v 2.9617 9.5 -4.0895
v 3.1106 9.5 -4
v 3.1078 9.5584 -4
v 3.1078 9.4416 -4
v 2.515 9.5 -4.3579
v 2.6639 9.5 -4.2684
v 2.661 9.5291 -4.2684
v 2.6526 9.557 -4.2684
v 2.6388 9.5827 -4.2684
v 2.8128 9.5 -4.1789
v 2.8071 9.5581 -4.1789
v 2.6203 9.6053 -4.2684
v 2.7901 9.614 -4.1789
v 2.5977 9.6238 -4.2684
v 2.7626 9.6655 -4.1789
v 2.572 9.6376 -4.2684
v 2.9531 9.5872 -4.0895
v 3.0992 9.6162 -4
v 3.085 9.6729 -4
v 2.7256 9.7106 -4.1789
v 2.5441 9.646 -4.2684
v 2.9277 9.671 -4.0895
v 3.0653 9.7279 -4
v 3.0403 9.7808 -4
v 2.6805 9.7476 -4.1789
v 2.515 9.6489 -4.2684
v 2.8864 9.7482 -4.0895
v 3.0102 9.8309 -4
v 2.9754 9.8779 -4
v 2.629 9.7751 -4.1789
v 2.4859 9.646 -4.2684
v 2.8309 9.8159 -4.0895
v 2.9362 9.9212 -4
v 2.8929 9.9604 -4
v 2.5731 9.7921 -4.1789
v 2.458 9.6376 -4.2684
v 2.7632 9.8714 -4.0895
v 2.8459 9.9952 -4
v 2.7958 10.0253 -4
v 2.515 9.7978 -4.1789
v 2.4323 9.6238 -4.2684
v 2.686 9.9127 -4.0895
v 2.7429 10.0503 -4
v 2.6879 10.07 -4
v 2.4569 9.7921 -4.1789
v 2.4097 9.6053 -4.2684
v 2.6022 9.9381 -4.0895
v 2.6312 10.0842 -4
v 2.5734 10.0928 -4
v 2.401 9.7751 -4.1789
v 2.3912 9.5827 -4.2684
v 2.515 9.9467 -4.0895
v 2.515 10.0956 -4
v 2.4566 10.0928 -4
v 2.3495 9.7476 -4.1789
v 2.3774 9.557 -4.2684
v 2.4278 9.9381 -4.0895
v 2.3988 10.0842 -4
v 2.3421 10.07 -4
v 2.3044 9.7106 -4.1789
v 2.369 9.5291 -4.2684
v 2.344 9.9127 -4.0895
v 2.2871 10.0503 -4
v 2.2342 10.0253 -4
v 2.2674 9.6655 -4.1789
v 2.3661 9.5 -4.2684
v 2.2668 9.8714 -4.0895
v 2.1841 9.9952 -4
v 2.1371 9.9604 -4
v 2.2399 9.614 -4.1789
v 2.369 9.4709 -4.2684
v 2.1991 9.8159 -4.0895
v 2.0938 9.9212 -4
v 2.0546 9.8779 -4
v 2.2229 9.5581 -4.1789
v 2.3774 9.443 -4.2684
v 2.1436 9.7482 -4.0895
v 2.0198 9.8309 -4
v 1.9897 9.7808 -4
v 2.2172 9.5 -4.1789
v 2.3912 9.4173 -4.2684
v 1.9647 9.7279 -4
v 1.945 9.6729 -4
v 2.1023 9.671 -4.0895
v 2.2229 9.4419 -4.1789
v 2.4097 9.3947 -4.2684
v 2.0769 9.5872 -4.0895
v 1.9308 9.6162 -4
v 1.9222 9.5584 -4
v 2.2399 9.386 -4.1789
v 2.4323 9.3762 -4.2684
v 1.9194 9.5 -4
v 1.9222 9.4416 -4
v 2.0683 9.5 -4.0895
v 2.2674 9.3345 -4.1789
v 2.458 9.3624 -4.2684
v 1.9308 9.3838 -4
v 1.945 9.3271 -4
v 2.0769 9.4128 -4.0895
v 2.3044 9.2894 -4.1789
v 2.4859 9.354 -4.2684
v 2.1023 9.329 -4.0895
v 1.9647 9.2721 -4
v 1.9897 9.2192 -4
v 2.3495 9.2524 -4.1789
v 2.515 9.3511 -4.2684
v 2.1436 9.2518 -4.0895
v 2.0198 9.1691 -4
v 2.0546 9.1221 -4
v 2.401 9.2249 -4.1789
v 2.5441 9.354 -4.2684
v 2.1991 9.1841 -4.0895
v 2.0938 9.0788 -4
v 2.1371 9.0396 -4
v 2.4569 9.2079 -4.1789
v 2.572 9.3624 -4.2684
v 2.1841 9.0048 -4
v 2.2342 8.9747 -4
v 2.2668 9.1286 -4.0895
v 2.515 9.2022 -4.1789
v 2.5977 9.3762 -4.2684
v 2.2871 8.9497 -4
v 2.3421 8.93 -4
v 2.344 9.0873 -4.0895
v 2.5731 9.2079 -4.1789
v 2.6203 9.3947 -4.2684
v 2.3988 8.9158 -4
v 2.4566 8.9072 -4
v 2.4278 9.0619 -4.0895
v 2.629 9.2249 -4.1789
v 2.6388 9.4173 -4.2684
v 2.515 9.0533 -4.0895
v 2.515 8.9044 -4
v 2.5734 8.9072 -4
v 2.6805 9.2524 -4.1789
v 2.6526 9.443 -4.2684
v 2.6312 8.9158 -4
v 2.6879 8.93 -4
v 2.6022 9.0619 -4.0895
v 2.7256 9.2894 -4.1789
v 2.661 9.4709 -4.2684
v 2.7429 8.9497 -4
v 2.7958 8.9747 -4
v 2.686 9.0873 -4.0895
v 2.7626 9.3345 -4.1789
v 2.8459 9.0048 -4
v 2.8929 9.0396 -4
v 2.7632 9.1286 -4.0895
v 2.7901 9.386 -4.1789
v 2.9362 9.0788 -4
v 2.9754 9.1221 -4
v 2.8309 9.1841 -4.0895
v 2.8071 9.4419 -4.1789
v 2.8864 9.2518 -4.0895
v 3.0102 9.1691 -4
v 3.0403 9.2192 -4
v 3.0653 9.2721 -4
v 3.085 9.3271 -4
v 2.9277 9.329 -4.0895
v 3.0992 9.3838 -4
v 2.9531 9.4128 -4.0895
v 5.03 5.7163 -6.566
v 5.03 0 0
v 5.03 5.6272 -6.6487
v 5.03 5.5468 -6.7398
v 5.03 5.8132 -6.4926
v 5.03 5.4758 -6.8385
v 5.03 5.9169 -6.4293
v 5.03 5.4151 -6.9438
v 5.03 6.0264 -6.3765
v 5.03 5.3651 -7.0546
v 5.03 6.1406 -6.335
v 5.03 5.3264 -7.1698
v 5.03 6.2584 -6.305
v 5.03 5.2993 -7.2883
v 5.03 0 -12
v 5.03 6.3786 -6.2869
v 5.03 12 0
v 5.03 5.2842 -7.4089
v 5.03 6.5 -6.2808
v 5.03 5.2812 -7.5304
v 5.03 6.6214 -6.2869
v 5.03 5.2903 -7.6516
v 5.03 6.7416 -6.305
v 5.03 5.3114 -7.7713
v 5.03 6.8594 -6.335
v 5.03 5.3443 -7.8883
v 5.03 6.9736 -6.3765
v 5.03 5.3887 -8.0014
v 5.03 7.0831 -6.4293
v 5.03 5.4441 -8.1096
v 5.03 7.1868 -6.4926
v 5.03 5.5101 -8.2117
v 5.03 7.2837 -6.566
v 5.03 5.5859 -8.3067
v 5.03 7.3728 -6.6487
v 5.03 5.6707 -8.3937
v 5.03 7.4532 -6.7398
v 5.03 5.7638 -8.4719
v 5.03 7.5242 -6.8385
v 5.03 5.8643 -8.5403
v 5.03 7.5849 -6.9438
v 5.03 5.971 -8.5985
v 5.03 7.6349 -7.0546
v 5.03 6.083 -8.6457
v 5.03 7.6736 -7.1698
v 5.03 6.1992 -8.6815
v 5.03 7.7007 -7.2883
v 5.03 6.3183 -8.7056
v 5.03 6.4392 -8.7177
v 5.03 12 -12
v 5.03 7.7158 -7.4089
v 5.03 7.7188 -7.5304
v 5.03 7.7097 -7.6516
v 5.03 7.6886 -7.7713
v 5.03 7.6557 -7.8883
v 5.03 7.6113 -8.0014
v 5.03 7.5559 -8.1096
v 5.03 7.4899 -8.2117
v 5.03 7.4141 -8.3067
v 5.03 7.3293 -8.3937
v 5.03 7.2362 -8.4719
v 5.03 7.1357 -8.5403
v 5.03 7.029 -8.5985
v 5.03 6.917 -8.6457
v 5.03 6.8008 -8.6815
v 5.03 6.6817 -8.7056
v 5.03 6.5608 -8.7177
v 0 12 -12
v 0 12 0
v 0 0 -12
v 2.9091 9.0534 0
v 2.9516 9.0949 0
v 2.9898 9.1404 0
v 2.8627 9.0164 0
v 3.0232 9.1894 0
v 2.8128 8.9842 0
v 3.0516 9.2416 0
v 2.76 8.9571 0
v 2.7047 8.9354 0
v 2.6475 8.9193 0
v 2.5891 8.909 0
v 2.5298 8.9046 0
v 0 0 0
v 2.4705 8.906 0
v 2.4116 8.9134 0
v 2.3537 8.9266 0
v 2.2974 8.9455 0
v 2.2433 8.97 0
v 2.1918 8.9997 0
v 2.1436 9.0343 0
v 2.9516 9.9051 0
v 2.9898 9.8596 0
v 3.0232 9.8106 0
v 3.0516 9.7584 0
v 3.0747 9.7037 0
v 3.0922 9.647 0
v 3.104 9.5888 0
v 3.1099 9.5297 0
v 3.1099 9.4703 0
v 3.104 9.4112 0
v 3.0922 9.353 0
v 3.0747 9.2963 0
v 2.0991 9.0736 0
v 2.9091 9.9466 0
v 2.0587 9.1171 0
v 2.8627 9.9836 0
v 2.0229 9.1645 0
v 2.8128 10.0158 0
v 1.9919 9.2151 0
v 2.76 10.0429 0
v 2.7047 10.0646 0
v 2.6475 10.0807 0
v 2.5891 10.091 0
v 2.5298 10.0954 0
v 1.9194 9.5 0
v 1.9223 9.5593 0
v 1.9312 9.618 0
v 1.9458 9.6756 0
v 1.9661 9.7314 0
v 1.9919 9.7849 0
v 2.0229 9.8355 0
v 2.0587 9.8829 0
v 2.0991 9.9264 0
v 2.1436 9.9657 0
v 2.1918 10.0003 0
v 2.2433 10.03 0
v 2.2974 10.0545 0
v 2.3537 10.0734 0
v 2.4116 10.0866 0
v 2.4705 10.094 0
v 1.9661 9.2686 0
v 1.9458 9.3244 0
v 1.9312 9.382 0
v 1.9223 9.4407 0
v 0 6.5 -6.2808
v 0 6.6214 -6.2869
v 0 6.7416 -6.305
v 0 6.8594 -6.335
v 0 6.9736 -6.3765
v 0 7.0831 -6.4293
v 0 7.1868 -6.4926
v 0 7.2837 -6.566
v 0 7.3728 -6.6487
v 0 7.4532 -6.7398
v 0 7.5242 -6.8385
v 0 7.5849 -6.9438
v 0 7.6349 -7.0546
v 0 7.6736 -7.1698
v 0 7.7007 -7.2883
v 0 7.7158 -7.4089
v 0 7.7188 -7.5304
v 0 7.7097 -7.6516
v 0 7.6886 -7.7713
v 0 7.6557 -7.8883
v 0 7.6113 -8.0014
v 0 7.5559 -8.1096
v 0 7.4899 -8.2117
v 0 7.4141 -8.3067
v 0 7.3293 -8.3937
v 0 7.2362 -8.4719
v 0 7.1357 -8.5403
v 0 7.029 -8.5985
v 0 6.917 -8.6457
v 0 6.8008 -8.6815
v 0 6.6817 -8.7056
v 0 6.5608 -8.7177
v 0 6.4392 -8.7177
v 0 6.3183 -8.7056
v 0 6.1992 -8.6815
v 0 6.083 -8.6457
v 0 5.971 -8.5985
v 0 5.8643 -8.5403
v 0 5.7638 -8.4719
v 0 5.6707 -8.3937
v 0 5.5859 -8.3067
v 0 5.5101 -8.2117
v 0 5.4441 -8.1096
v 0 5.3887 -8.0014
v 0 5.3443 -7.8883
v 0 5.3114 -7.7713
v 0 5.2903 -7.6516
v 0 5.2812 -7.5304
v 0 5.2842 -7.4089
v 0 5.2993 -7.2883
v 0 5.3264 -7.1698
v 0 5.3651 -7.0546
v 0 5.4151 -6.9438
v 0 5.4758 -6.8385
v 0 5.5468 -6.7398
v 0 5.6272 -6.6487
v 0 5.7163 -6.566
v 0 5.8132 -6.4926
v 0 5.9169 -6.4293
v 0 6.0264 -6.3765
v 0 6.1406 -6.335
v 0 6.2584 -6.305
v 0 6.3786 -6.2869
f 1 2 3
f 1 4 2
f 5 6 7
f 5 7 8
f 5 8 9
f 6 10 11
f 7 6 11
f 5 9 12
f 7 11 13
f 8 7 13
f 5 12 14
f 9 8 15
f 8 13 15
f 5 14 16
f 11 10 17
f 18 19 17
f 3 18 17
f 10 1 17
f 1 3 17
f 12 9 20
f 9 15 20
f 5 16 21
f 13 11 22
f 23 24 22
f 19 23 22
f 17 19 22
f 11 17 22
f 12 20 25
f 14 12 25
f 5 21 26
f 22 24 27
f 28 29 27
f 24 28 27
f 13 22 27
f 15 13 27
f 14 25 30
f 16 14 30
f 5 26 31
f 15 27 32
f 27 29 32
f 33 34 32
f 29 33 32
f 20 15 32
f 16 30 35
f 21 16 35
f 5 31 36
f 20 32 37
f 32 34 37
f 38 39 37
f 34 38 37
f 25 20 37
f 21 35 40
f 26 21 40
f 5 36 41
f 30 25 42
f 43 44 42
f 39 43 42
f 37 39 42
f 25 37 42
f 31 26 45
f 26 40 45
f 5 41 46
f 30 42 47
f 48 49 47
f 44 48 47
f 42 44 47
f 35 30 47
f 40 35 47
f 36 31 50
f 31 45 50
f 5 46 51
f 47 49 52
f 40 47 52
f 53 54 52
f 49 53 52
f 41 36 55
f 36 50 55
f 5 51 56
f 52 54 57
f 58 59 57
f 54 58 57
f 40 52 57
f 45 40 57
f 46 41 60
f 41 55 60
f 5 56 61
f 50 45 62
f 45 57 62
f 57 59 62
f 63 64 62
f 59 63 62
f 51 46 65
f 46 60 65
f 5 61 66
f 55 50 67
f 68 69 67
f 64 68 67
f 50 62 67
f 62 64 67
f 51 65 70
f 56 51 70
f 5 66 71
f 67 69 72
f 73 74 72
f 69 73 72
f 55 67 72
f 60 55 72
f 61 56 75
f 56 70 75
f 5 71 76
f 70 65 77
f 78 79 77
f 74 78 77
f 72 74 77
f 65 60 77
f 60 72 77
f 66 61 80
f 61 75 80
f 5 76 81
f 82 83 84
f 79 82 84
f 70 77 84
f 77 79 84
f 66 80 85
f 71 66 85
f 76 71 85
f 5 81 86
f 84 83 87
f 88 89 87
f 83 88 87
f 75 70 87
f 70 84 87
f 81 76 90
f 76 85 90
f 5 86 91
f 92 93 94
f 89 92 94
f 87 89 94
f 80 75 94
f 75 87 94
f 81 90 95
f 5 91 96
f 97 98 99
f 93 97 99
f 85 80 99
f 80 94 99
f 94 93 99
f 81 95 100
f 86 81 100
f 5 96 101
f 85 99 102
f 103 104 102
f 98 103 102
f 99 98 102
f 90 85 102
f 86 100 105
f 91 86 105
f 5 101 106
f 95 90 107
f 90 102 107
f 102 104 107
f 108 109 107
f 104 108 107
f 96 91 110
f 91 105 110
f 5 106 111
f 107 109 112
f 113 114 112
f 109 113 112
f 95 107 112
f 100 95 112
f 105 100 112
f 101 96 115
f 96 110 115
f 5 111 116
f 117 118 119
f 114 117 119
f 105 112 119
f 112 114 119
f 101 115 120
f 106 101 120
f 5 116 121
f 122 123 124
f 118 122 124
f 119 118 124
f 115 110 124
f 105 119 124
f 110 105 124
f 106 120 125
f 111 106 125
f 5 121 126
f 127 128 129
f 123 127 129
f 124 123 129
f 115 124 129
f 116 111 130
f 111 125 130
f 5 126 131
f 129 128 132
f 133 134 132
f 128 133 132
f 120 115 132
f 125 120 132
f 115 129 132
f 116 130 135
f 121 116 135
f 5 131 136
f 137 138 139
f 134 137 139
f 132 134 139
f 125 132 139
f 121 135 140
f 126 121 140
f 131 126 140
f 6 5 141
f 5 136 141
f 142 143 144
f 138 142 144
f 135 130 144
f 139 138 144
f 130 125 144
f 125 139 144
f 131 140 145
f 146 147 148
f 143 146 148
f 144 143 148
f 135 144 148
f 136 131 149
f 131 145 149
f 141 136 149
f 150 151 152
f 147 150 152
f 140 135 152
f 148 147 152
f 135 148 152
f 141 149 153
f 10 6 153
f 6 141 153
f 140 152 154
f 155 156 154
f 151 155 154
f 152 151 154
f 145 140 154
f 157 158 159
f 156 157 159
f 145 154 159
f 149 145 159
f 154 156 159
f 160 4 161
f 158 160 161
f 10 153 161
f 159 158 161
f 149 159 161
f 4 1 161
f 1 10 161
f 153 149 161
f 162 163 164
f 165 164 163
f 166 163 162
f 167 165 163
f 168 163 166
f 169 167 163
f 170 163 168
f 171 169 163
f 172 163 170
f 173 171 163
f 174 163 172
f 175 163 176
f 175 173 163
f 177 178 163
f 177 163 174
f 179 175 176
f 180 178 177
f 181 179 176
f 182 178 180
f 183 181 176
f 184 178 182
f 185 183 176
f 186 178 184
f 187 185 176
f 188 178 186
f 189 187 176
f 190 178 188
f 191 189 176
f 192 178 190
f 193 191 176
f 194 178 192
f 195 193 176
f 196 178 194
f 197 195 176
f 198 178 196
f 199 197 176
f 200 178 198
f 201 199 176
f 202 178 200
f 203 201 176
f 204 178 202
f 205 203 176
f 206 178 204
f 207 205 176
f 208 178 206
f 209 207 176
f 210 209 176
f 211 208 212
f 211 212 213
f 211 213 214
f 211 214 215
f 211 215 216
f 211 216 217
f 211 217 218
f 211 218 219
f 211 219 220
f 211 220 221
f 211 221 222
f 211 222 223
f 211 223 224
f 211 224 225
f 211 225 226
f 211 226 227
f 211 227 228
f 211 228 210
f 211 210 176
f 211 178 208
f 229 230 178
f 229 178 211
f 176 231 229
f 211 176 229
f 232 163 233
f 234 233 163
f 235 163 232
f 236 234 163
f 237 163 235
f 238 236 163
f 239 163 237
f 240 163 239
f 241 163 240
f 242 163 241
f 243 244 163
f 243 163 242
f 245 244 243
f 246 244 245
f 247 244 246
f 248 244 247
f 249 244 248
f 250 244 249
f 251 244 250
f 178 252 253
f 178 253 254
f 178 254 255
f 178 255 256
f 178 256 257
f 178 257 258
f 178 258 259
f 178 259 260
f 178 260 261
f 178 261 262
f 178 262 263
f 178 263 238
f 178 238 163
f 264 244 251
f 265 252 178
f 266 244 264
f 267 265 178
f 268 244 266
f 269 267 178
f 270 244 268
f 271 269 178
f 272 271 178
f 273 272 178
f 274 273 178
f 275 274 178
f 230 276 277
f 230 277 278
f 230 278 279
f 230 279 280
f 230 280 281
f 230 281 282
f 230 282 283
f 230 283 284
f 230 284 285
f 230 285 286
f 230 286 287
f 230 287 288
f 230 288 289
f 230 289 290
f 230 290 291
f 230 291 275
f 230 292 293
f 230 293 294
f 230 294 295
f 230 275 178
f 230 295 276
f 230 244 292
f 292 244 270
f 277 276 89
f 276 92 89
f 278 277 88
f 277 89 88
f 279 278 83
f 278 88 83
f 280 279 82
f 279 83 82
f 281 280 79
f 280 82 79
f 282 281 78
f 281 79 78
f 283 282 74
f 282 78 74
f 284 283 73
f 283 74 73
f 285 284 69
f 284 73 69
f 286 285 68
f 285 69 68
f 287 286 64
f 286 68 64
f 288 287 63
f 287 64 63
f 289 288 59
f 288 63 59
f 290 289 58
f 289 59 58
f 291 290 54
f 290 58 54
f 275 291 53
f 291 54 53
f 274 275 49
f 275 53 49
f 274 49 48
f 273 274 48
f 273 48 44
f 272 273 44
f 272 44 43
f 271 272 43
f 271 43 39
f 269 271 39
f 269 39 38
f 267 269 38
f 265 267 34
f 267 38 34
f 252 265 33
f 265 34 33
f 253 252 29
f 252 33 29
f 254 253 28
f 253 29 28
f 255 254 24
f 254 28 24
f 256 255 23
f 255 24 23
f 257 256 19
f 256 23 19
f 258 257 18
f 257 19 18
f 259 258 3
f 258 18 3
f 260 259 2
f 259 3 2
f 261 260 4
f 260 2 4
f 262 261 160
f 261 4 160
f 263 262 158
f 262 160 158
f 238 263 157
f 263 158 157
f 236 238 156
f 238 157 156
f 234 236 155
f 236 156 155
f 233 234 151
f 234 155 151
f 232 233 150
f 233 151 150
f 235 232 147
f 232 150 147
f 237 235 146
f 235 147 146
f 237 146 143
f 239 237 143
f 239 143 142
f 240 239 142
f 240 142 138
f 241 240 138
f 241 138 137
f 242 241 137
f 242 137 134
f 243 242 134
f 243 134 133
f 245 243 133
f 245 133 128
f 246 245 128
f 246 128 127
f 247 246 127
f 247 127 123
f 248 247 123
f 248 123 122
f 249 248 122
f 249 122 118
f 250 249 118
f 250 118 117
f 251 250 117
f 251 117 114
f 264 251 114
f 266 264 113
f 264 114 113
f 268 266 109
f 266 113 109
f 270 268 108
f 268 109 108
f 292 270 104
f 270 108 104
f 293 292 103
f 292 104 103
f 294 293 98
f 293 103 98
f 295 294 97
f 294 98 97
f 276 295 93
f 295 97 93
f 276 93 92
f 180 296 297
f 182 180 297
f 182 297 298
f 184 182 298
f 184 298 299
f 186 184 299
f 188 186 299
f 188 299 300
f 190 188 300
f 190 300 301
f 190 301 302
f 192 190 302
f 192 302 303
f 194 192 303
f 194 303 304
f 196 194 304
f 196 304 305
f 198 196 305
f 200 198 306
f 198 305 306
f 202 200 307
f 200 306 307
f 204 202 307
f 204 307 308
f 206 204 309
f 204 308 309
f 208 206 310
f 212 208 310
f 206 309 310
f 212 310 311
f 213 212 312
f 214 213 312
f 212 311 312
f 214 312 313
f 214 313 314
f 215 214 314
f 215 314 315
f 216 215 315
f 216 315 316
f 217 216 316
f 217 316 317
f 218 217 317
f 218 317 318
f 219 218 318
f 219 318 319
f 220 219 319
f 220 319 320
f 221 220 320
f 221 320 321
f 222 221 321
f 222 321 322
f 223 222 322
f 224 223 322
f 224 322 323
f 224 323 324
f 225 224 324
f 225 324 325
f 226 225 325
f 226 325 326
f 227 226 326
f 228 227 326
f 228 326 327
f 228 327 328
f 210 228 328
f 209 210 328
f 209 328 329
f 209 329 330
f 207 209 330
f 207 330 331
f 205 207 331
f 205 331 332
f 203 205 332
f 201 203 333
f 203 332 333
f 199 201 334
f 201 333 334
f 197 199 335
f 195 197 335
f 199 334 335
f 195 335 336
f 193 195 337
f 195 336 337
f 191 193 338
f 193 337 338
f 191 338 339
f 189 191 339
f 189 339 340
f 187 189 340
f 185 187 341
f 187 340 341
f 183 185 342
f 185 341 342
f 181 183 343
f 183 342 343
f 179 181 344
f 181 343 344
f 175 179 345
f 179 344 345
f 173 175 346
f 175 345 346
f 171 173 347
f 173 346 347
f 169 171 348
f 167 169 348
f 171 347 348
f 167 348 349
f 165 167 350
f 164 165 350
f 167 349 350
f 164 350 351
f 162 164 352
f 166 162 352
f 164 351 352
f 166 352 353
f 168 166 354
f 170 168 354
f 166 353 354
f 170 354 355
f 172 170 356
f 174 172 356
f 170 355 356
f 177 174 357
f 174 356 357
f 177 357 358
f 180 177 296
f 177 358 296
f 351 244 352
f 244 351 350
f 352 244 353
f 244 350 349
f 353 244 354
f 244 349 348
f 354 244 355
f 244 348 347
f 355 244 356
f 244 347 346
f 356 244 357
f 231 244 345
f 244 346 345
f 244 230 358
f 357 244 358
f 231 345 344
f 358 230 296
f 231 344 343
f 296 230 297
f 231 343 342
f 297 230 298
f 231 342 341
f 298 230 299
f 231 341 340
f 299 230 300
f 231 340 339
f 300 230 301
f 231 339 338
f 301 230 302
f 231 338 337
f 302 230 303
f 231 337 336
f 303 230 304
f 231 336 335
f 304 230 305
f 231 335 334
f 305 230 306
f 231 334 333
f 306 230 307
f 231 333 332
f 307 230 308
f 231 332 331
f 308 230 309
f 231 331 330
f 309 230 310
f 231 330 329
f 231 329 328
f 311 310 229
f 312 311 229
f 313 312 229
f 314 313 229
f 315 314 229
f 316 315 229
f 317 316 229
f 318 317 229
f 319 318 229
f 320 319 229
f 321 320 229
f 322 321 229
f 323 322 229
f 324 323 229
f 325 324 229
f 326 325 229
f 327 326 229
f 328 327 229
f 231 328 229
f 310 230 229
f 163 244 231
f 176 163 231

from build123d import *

# Parameters (mm, degrees)
SKETCH1_W                     = 12
SKETCH1_H                     = 12
BOSS_EXTRUDE1_DEPTH           = 5.03
TAP_DRILL_FOR_0_80_TAP1_D     = 1.19126
TAP_DRILL_FOR_0_80_TAP1_DEPTH = 4
TAP_DRILL_FOR_0_80_TAP1_TIP   = 0.357890611
F_2_CLEARANCE_HOLE1_D         = 2.4384


with BuildPart() as part:
    # Sketch1 → Boss-Extrude1 (new body)
    with BuildSketch(Plane(origin=(0, 0, 0), x_dir=(0, 0, -1), z_dir=(1, 0, 0))):
        with Locations((6, 6)):
            Rectangle(SKETCH1_W, SKETCH1_H)
    extrude(amount=BOSS_EXTRUDE1_DEPTH)

    # Tap Drill for #0-80 Tap1
    with Locations(Plane.XY):
        with Locations((2.515, 9.5)):
            Hole(TAP_DRILL_FOR_0_80_TAP1_D / 2, depth=TAP_DRILL_FOR_0_80_TAP1_DEPTH)
            with Locations((0, 0, -(TAP_DRILL_FOR_0_80_TAP1_DEPTH + TAP_DRILL_FOR_0_80_TAP1_TIP / 2))):  # 118° drill point
                Cone(0, TAP_DRILL_FOR_0_80_TAP1_D / 2, TAP_DRILL_FOR_0_80_TAP1_TIP, mode=Mode.SUBTRACT)

    # #2 Clearance Hole1 (through all)
    with Locations(Plane(origin=(5.03, 0, 0), x_dir=(0, 0, -1), z_dir=(1, 0, 0))):
        with Locations((7.5, 6.5)):
            Hole(F_2_CLEARANCE_HOLE1_D / 2)


solid = part.part
